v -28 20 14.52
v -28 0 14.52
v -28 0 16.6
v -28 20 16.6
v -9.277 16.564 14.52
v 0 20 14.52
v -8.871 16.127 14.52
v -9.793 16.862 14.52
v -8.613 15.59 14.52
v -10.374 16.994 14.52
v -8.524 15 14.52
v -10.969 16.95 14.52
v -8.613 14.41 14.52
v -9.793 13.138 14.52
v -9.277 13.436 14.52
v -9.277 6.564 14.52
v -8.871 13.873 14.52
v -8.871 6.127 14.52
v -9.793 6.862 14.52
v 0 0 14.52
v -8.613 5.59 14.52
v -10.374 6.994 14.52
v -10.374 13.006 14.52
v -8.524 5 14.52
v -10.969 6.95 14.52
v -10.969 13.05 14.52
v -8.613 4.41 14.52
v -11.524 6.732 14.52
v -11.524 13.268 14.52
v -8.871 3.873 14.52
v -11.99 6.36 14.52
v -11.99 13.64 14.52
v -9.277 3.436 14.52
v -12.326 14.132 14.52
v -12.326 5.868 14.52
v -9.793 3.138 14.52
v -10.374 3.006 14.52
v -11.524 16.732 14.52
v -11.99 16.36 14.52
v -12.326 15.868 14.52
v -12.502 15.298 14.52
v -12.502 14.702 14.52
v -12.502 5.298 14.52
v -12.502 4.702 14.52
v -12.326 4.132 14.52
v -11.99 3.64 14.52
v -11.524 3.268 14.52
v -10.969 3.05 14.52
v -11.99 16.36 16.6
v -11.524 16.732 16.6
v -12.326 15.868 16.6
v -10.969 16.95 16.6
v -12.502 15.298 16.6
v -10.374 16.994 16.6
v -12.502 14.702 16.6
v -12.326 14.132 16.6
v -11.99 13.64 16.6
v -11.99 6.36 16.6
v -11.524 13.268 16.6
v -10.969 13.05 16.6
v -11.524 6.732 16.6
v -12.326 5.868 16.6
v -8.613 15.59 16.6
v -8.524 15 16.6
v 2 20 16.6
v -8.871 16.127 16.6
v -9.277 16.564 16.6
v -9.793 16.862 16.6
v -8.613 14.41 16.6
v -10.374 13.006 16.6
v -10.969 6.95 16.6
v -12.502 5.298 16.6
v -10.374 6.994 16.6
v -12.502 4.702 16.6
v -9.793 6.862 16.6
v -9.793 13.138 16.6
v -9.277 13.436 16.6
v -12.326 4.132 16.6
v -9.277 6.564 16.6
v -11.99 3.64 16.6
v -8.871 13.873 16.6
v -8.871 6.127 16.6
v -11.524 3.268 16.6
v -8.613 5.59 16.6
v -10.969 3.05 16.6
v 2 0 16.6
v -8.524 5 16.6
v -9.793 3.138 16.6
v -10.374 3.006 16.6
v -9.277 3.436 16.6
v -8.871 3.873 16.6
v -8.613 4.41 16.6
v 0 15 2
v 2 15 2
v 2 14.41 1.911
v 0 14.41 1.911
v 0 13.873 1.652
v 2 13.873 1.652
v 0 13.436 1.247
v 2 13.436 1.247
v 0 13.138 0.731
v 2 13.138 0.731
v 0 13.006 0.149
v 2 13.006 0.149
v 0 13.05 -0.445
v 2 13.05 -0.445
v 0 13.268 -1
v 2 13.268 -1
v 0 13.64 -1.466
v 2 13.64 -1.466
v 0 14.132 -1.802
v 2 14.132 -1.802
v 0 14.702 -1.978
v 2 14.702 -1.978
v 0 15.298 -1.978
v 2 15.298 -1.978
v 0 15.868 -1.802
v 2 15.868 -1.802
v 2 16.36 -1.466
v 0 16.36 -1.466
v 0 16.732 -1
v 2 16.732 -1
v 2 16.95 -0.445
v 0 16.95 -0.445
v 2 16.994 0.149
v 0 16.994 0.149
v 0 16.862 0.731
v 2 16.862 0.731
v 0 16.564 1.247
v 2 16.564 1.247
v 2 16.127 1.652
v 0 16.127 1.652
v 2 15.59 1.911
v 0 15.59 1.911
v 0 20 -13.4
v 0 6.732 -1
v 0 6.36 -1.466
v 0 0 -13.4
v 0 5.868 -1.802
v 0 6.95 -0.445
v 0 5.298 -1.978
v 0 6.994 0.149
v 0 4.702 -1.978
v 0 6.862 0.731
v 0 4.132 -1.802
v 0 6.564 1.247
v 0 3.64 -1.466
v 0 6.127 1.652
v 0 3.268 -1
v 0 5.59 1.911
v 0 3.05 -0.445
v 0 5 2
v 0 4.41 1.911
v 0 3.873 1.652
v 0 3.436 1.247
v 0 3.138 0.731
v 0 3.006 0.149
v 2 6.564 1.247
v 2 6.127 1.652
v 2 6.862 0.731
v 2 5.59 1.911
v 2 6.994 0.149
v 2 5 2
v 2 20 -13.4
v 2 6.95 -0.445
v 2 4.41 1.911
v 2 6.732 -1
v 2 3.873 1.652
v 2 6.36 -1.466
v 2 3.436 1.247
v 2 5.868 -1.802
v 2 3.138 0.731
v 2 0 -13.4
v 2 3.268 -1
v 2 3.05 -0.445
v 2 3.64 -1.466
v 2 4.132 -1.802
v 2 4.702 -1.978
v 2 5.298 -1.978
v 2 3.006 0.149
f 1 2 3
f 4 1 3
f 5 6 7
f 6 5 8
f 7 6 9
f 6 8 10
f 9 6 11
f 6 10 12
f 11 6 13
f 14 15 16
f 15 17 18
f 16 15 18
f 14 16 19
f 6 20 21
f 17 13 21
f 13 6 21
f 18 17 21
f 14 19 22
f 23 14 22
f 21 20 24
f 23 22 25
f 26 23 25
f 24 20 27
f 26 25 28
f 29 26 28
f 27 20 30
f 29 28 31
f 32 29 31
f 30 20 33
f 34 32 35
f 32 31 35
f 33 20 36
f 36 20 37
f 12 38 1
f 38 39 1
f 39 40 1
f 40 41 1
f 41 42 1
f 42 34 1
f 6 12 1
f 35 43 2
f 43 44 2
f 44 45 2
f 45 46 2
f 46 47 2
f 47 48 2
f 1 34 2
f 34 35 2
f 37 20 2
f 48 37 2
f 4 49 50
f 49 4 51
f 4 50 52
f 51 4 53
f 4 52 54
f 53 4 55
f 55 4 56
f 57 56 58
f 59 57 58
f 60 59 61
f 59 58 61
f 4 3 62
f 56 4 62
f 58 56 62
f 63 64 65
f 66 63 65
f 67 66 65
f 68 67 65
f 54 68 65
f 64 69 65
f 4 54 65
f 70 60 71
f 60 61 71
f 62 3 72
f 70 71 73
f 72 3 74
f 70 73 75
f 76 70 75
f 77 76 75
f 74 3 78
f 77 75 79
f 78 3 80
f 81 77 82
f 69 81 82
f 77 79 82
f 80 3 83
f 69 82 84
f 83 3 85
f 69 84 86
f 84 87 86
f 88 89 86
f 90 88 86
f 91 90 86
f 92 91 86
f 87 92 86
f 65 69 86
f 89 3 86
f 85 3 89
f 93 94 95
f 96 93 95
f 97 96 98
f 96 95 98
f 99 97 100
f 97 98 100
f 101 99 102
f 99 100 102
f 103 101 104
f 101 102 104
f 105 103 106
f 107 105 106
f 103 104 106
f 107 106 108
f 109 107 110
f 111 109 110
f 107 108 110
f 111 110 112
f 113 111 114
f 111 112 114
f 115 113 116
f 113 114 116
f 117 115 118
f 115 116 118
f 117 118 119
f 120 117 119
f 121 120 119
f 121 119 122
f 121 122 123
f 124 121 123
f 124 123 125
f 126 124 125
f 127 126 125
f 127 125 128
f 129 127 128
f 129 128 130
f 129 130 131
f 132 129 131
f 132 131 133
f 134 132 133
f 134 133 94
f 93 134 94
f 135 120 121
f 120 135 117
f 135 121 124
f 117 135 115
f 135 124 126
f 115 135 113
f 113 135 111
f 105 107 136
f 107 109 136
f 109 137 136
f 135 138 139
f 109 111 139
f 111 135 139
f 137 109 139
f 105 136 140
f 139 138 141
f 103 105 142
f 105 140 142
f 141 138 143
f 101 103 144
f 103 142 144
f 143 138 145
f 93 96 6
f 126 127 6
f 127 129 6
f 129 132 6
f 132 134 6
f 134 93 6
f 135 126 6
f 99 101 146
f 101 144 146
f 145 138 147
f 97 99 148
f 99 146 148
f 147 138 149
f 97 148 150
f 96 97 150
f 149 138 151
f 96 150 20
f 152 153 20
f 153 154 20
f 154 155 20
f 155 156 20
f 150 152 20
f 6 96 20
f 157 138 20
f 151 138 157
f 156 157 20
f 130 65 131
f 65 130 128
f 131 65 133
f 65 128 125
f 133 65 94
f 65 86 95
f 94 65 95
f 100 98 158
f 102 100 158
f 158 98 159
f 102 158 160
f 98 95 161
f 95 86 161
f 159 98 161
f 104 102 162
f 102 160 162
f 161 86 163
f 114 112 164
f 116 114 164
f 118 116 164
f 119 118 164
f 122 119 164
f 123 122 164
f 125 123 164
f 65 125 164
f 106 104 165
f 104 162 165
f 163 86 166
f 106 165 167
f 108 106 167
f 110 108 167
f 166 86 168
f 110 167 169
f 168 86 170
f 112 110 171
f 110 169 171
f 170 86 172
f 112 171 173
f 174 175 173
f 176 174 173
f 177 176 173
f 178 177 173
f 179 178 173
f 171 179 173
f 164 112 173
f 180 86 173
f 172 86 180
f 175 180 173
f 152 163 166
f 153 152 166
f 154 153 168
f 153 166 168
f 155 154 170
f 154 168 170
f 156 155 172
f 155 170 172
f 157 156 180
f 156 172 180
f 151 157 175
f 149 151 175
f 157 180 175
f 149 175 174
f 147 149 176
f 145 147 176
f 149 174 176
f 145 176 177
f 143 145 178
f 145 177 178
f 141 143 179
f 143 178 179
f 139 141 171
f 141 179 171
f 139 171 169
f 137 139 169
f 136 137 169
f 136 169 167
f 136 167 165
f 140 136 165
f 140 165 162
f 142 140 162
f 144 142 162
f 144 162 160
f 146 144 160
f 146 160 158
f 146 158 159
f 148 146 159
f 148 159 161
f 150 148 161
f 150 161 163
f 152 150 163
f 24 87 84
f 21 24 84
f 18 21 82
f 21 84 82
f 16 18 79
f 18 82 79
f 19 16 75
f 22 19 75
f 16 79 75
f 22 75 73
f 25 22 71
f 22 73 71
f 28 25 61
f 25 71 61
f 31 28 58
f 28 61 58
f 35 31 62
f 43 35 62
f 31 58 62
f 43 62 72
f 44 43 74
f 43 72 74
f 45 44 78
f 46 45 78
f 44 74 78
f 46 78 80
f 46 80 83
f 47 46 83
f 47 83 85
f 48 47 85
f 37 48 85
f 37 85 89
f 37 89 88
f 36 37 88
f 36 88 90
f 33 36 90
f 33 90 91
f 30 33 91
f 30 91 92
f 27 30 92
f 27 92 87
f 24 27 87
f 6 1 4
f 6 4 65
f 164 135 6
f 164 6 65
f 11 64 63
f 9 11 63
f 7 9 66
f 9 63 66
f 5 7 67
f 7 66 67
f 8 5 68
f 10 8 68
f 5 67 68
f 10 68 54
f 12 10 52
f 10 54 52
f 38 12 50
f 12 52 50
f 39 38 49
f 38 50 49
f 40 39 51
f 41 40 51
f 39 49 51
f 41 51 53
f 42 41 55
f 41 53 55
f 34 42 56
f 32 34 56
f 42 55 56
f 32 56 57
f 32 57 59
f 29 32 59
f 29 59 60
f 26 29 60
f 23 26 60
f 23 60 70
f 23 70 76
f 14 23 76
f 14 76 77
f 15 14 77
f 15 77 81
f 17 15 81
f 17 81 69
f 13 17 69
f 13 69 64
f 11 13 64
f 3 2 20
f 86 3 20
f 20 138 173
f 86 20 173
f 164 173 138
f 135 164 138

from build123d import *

# Parameters (mm, degrees)
BOSS_EXTRUDE1_DEPTH            = 20
CUT_EXTRUDE4_REACH             = 41.693
SKETCH2_R                      = 2
CUT_EXTRUDE4_DIRECTION_2_DEPTH = 40.693324376
CUT_EXTRUDE5_REACH             = 47.651
SKETCH3_R                      = 2


with BuildPart() as part:
    # Sketch1 → Boss-Extrude1 (new body)
    with BuildSketch(Plane(origin=(0, 0, 0), x_dir=(1, 0, 0), z_dir=(0, 1, 0))):
        Polygon((0, 13.4), (0, -14.52), (-28, -14.52), (-28, -16.6), (2, -16.6), (2, 13.4), align=None)
    extrude(amount=BOSS_EXTRUDE1_DEPTH)

    # Sketch2 → Cut-Extrude4 (cut, up to next)
    with BuildSketch(Plane(origin=(2, 0, 0), x_dir=(0, 0, -1), z_dir=(1, 0, 0)), mode=Mode.PRIVATE) as cut_extrude4_sk1:
        with Locations(Location((0, 15, 0), (0, 0, 180))):
            Circle(SKETCH2_R)
    cut_extrude4_tool1 = extrude(cut_extrude4_sk1.sketch, amount=-CUT_EXTRUDE4_REACH, mode=Mode.PRIVATE) & part.part
    # Sketch2 → Cut-Extrude4 (cut, up to next)
    with BuildSketch(Plane(origin=(2, 0, 0), x_dir=(0, 0, -1), z_dir=(1, 0, 0)), mode=Mode.PRIVATE) as cut_extrude4_sk2:
        with Locations(Location((0, 5, 0), (0, 0, 180))):
            Circle(SKETCH2_R)
    cut_extrude4_tool2 = extrude(cut_extrude4_sk2.sketch, amount=-CUT_EXTRUDE4_REACH, mode=Mode.PRIVATE) & part.part
    add(cut_extrude4_tool1.solids().sort_by_distance((2, 15, 0))[0], mode=Mode.SUBTRACT)
    add(cut_extrude4_tool2.solids().sort_by_distance((2, 5, 0))[0], mode=Mode.SUBTRACT)

    # Sketch2 → Cut-Extrude4 direction 2 (cut)
    with BuildSketch(Plane(origin=(2, 0, 0), x_dir=(0, 0, -1), z_dir=(1, 0, 0))):
        with Locations(Location((0, 15, 0), (0, 0, 180))):
            Circle(SKETCH2_R)
        with Locations(Location((0, 5, 0), (0, 0, 180))):
            Circle(SKETCH2_R)
    extrude(amount=CUT_EXTRUDE4_DIRECTION_2_DEPTH, mode=Mode.SUBTRACT)

    # Sketch3 → Cut-Extrude5 (cut, up to next)
    with BuildSketch(Plane.XY.offset(16.6), mode=Mode.PRIVATE) as cut_extrude5_sk1:
        with Locations((-10.523881442, 15)):
            Circle(SKETCH3_R)
    cut_extrude5_tool1 = extrude(cut_extrude5_sk1.sketch, amount=-CUT_EXTRUDE5_REACH, mode=Mode.PRIVATE) & part.part
    # Sketch3 → Cut-Extrude5 (cut, up to next)
    with BuildSketch(Plane.XY.offset(16.6), mode=Mode.PRIVATE) as cut_extrude5_sk2:
        with Locations((-10.523881442, 5)):
            Circle(SKETCH3_R)
    cut_extrude5_tool2 = extrude(cut_extrude5_sk2.sketch, amount=-CUT_EXTRUDE5_REACH, mode=Mode.PRIVATE) & part.part
    add(cut_extrude5_tool1.solids().sort_by_distance((-10.523881, 15, 16.6))[0], mode=Mode.SUBTRACT)
    add(cut_extrude5_tool2.solids().sort_by_distance((-10.523881, 5, 16.6))[0], mode=Mode.SUBTRACT)


solid = part.part
